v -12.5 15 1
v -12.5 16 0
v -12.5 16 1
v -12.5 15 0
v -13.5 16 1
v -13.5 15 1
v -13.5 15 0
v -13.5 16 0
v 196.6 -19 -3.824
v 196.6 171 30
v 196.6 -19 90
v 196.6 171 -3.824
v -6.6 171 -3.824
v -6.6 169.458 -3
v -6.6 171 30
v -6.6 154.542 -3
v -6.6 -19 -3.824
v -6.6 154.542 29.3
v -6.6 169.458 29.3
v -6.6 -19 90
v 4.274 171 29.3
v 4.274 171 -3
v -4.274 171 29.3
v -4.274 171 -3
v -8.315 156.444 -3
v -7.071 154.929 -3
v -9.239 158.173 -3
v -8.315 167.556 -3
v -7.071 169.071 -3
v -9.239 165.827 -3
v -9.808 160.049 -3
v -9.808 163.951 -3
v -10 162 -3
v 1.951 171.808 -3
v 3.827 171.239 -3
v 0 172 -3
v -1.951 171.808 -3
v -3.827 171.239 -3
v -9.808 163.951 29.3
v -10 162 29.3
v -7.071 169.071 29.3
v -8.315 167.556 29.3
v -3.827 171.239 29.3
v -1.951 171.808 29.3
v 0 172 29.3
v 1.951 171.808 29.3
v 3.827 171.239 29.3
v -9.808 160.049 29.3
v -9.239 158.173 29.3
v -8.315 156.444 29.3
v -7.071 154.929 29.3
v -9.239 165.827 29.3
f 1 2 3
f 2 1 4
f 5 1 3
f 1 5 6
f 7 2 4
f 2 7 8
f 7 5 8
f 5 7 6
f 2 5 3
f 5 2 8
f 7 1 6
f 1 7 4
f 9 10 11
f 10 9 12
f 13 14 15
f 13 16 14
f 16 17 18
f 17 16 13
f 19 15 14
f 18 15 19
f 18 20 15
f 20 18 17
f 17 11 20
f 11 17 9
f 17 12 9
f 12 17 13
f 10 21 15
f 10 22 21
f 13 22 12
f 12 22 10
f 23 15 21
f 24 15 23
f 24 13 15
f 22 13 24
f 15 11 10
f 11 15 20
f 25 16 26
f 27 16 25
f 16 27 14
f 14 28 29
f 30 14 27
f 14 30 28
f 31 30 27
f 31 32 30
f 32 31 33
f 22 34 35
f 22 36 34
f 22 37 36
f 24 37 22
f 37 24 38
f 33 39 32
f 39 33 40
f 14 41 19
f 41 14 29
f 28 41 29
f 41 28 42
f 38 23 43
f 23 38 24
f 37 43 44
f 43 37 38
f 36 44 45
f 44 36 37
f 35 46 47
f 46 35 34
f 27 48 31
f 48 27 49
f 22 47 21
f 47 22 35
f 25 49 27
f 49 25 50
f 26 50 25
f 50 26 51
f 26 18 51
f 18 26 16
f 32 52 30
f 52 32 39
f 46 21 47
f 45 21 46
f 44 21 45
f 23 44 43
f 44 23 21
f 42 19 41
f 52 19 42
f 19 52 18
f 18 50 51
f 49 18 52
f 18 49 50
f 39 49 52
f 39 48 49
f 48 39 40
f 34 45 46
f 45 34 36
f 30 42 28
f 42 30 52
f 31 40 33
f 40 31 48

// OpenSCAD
// file: BBB.scad
$fn = 32;

small = 0.1;
inch = 25.4; 
boardLength = 3.400 * inch;
boardWidth  = 2.150 * inch;
boardHeight  = 1.5;
boardSize = [boardLength, boardWidth, boardHeight];
boardColor = [0.3,0.3,0.3];

ethSize     = [21.0,17.0,13.5];
ethOffset   = [-2.5,21.25,boardHeight+0.8];

usbHostSize     = [14.0,15.5,7.0];
usbHostOffset   = [boardLength-usbHostSize[0],9,boardHeight+0.7];

usbSize         = [7.0,7.8,4.5];
usbOffset       = [-.2,40,-usbSize[2]+0.5];

hdmiSize        = [8.0,8.0,3.5];
hdmiOffset      = [boardLength-hdmiSize[0]+0.5,20.8,-hdmiSize[2]+0.5];

sdSize   = [15.0,14.0,1.6];
sdOffset = [boardLength-sdSize[0],30,-sdSize[2]];

powerSize = [14.0,9.5,11.0];
powerOffset = [-2.5,4.75,boardHeight];

headerSize = [58.6,5.0,8.8];
headerOffset1 = [18.3,0.3,boardHeight];
headerOffset2 = [18.3,boardWidth-0.3-headerSize[1],boardHeight];

clearanceLength = 0;
clearanceColor = [0.5,0.5,0.8,0.0];

holeR = 0.125/2 * inch;
hole1Pos = [0.575 * inch, 0.125 * inch, 0];
hole2Pos = [0.575 * inch, 2.025 * inch, 0];
hole3Pos = [3.175 * inch, 0.250 * inch, 0];
hole4Pos = [3.175 * inch, 1.900 * inch, 0];

module board()
{
  cube([boardLength, boardWidth, boardHeight]);
  translate(headerOffset1) cube(headerSize);
  translate(headerOffset2) cube(headerSize);
}


module cornerNegative(centre, radius, rotation)
{
  translate(centre) {
    rotate([0,0,rotation])
    {
      difference()
      {
        translate([-small,-small,-small/2]) {
          cube([radius+small,radius+small,boardHeight+small]);
        }
        translate([radius,radius,-small]) {
          cylinder(h=boardHeight+small*2,r=radius, center=false);
        }
      }
    }
  }
}

module mountingHole(centre)
{
   translate(centre) {
     translate([0,0,boardHeight/2]) {
       cylinder(r=holeR,h=boardHeight+small,center=true);
     }
   }
}

module ethernetBlock()
{
  translate(ethOffset) 
  {
    cube(ethSize);
    translate([-clearanceLength,0,0]) {
      color(clearanceColor) cube([clearanceLength+small,ethSize[1],ethSize[2]]);
    }
  }
}


module usbHostBlock()
{
  translate(usbHostOffset) 
  {
    cube(usbHostSize);
    translate([usbHostSize[0]-small,0,0]) {
      color(clearanceColor) cube([clearanceLength+small,usbHostSize[1],usbHostSize[2]]);
    }
  }
}

module usbBlock()
{
  translate(usbOffset)
  {
    cube(usbSize);
    translate([-clearanceLength,0,0]) {
      color(clearanceColor) cube([clearanceLength+small,usbSize[1],usbSize[2]]);
    }
  }
}

module sdBlock()
{
  translate(sdOffset)
  {
    cube(sdSize);
    translate([sdSize[0]-small,0,0]) {
      color(clearanceColor) cube([clearanceLength+small,sdSize[1],sdSize[2]]);
    }
  }        
}

module hdmiBlock()
{
  translate(hdmiOffset)
  {
    cube(hdmiSize);
    translate([hdmiSize[0]-small,0,0]) {
      color(clearanceColor) cube([clearanceLength+small,hdmiSize[1],hdmiSize[2]]);
    }

  }
}

module powerBlock()
{
  translate(powerOffset)
  {
    cube(powerSize);
    translate([-clearanceLength,0,0]) {
      color(clearanceColor) cube([clearanceLength+small,powerSize[1],powerSize[2]]);
    }
  }
}

module boardNegative()
{
   cornerNegative([0,0,0], 0.250 * inch, 0);
   cornerNegative([0,boardWidth,0], 0.250 * inch, 270);
   cornerNegative([boardLength,0,0], 0.500 * inch, 90);
   cornerNegative([boardLength,boardWidth,0], 0.500 * inch, 180);
   mountingHole(hole1Pos);
   mountingHole(hole2Pos);
   mountingHole(hole3Pos);
   mountingHole(hole4Pos);
}

module beagleboneblack() 
{
  color(boardColor) {
    difference() {
      board();
      boardNegative();
    }
  }
  ethernetBlock();
  usbHostBlock();
  usbBlock();
  hdmiBlock();
  sdBlock();
  powerBlock();
}

module LVDS(){
  color([1, 1, 1]) {
    difference() {
      board();
      boardNegative();
    }
  }
}
// main file
mm = 1.;
inch = 25.4 * mm;
include <BBB.scad>;

translate([.8730*inch - hole1Pos[0], .3340*inch - hole1Pos[1], 0]){
  translate([0, boardWidth / 2,12*mm ])
    rotate(180, [1, 0, 0])
    translate([0, -boardWidth/2,0 ])
    LVDS();

  translate([0, boardWidth / 2,24*mm ])
    rotate(180, [1, 0, 0])
    translate([0, -boardWidth/2,0 ])
    beagleboneblack();
}

$fs=25;

// mouting holes:

uC_HOLES = [[4 * mm, 4 * mm],
	    [4 * mm, 76 * mm],
	    [4 * mm, 118 * mm],
	    [4 * mm, 148 * mm],
	    [95 * mm, 4 * mm],
	    [95 * mm, 76 * mm],
	    [186 * mm ,148 * mm],
	    [186 * mm ,118 * mm],
	    [186 * mm, 76 * mm],
	    [186 * mm, 4 * mm],
	    ];

uC_LENGTH = 190 * mm;
uC_WIDTH = 152 * mm;
uC_HEIGHT = .06 * inch;
HOLE_D = 3 * mm;
HOLE_R = HOLE_D / 2;
small = .1;
module uC_mountingHole(centre){
  echo("HOLE", centre);
  translate([centre[0], centre[1], uC_HEIGHT / 2 ]) {
    cylinder(r=HOLE_R,h=20 * (2 * uC_HEIGHT + small),center=true);
  }
}

module uC_board(){
  cube([uC_LENGTH, uC_WIDTH, uC_HEIGHT]);
}

module uC_board_neg(){
  for(i=[0:len(uC_HOLES) - 1]){
    uC_mountingHole(uC_HOLES[i]);
  }
}

module uControl(){
  difference(){
    uC_board();
    uC_board_neg();
  }
}

module usbhub(){
  color(boardColor){
    cube([90 * mm, 30 * mm, 8 * mm]);
    translate([67 * mm, 6*mm, 8*mm])
      cube([7 * mm, 15 * mm, 15 * mm]);
    translate([80 * mm, 6*mm, 8*mm])
      cube([7 * mm, 15 * mm, 15 * mm]);
  }
}

flow_r = 22.3 * mm / 2;
flow_l = 81.6 * mm;translate([-flow_ctrl_box_l/2, flow_ctrl_box_w / 2, 0])
cube([flow_l, flow_height - 2 * flow_r]);

flow_height = 34.2 * mm; 
flow_ctrl_box_l = 27*mm;
flow_ctrl_box_w = 30*mm;
flow_smooth_l = 100*mm;

module Flow(){
  translate([45 * mm, 133 * mm, 2  * flow_r]){
    translate([-flow_ctrl_box_l/2, -flow_ctrl_box_w / 2, ])
      color("red")cube([flow_ctrl_box_l, flow_ctrl_box_w, flow_height - 2 * flow_r]);
    translate([0, 0, -flow_r])
      rotate(90, [0, 1, 0])
      translate([0, 0, -flow_l/2])
      cylinder(flow_l + flow_smooth_l, flow_r, flow_r);
  }
}

pump_r = 27*mm / 2;
pump_h = 63*mm;
module Pump(){
  translate([4.0 * inch + pump_h, 4.0 * inch,  pump_r])
    rotate(-90, [0, 1, 0]){
    translate([0, 0, pump_h])cylinder(r=1.5*mm, h=10*mm);
    cylinder(r=pump_r, h=pump_h);
  }
}

interior_w = 8*inch;
module Interior(){
  color([0, 1, 0, .3])
  translate([-interior_w/2, 0, 0])
  rotate(90, [0, 0, 1])
    rotate(90, [1, 0, 0]){
    linear_extrude(height=interior_w)
      polygon(points=[
		      [-uC_LENGTH/2, -2*flow_r - uC_HEIGHT - 10*mm],
		      [uC_LENGTH/2, -2*flow_r - uC_HEIGHT - 10*mm],
		      [uC_LENGTH/2, 60*mm],
		      [-uC_LENGTH/2, 0*mm]
		      ], paths=[[0, 1, 2, 3]]);
  }
}


translate([0, 0, -uC_HEIGHT]) uControl();
translate([8*mm, 30*mm, 24*mm])usbhub();
Flow();
Pump();
translate([uC_LENGTH/2, uC_WIDTH/2, 30*mm])
rotate(180, [0, 0, 1])
Interior();
translate([0, uC_WIDTH + 10, -3])
cylinder(r=10, h=flow_r * 2 + 10 *mm);
